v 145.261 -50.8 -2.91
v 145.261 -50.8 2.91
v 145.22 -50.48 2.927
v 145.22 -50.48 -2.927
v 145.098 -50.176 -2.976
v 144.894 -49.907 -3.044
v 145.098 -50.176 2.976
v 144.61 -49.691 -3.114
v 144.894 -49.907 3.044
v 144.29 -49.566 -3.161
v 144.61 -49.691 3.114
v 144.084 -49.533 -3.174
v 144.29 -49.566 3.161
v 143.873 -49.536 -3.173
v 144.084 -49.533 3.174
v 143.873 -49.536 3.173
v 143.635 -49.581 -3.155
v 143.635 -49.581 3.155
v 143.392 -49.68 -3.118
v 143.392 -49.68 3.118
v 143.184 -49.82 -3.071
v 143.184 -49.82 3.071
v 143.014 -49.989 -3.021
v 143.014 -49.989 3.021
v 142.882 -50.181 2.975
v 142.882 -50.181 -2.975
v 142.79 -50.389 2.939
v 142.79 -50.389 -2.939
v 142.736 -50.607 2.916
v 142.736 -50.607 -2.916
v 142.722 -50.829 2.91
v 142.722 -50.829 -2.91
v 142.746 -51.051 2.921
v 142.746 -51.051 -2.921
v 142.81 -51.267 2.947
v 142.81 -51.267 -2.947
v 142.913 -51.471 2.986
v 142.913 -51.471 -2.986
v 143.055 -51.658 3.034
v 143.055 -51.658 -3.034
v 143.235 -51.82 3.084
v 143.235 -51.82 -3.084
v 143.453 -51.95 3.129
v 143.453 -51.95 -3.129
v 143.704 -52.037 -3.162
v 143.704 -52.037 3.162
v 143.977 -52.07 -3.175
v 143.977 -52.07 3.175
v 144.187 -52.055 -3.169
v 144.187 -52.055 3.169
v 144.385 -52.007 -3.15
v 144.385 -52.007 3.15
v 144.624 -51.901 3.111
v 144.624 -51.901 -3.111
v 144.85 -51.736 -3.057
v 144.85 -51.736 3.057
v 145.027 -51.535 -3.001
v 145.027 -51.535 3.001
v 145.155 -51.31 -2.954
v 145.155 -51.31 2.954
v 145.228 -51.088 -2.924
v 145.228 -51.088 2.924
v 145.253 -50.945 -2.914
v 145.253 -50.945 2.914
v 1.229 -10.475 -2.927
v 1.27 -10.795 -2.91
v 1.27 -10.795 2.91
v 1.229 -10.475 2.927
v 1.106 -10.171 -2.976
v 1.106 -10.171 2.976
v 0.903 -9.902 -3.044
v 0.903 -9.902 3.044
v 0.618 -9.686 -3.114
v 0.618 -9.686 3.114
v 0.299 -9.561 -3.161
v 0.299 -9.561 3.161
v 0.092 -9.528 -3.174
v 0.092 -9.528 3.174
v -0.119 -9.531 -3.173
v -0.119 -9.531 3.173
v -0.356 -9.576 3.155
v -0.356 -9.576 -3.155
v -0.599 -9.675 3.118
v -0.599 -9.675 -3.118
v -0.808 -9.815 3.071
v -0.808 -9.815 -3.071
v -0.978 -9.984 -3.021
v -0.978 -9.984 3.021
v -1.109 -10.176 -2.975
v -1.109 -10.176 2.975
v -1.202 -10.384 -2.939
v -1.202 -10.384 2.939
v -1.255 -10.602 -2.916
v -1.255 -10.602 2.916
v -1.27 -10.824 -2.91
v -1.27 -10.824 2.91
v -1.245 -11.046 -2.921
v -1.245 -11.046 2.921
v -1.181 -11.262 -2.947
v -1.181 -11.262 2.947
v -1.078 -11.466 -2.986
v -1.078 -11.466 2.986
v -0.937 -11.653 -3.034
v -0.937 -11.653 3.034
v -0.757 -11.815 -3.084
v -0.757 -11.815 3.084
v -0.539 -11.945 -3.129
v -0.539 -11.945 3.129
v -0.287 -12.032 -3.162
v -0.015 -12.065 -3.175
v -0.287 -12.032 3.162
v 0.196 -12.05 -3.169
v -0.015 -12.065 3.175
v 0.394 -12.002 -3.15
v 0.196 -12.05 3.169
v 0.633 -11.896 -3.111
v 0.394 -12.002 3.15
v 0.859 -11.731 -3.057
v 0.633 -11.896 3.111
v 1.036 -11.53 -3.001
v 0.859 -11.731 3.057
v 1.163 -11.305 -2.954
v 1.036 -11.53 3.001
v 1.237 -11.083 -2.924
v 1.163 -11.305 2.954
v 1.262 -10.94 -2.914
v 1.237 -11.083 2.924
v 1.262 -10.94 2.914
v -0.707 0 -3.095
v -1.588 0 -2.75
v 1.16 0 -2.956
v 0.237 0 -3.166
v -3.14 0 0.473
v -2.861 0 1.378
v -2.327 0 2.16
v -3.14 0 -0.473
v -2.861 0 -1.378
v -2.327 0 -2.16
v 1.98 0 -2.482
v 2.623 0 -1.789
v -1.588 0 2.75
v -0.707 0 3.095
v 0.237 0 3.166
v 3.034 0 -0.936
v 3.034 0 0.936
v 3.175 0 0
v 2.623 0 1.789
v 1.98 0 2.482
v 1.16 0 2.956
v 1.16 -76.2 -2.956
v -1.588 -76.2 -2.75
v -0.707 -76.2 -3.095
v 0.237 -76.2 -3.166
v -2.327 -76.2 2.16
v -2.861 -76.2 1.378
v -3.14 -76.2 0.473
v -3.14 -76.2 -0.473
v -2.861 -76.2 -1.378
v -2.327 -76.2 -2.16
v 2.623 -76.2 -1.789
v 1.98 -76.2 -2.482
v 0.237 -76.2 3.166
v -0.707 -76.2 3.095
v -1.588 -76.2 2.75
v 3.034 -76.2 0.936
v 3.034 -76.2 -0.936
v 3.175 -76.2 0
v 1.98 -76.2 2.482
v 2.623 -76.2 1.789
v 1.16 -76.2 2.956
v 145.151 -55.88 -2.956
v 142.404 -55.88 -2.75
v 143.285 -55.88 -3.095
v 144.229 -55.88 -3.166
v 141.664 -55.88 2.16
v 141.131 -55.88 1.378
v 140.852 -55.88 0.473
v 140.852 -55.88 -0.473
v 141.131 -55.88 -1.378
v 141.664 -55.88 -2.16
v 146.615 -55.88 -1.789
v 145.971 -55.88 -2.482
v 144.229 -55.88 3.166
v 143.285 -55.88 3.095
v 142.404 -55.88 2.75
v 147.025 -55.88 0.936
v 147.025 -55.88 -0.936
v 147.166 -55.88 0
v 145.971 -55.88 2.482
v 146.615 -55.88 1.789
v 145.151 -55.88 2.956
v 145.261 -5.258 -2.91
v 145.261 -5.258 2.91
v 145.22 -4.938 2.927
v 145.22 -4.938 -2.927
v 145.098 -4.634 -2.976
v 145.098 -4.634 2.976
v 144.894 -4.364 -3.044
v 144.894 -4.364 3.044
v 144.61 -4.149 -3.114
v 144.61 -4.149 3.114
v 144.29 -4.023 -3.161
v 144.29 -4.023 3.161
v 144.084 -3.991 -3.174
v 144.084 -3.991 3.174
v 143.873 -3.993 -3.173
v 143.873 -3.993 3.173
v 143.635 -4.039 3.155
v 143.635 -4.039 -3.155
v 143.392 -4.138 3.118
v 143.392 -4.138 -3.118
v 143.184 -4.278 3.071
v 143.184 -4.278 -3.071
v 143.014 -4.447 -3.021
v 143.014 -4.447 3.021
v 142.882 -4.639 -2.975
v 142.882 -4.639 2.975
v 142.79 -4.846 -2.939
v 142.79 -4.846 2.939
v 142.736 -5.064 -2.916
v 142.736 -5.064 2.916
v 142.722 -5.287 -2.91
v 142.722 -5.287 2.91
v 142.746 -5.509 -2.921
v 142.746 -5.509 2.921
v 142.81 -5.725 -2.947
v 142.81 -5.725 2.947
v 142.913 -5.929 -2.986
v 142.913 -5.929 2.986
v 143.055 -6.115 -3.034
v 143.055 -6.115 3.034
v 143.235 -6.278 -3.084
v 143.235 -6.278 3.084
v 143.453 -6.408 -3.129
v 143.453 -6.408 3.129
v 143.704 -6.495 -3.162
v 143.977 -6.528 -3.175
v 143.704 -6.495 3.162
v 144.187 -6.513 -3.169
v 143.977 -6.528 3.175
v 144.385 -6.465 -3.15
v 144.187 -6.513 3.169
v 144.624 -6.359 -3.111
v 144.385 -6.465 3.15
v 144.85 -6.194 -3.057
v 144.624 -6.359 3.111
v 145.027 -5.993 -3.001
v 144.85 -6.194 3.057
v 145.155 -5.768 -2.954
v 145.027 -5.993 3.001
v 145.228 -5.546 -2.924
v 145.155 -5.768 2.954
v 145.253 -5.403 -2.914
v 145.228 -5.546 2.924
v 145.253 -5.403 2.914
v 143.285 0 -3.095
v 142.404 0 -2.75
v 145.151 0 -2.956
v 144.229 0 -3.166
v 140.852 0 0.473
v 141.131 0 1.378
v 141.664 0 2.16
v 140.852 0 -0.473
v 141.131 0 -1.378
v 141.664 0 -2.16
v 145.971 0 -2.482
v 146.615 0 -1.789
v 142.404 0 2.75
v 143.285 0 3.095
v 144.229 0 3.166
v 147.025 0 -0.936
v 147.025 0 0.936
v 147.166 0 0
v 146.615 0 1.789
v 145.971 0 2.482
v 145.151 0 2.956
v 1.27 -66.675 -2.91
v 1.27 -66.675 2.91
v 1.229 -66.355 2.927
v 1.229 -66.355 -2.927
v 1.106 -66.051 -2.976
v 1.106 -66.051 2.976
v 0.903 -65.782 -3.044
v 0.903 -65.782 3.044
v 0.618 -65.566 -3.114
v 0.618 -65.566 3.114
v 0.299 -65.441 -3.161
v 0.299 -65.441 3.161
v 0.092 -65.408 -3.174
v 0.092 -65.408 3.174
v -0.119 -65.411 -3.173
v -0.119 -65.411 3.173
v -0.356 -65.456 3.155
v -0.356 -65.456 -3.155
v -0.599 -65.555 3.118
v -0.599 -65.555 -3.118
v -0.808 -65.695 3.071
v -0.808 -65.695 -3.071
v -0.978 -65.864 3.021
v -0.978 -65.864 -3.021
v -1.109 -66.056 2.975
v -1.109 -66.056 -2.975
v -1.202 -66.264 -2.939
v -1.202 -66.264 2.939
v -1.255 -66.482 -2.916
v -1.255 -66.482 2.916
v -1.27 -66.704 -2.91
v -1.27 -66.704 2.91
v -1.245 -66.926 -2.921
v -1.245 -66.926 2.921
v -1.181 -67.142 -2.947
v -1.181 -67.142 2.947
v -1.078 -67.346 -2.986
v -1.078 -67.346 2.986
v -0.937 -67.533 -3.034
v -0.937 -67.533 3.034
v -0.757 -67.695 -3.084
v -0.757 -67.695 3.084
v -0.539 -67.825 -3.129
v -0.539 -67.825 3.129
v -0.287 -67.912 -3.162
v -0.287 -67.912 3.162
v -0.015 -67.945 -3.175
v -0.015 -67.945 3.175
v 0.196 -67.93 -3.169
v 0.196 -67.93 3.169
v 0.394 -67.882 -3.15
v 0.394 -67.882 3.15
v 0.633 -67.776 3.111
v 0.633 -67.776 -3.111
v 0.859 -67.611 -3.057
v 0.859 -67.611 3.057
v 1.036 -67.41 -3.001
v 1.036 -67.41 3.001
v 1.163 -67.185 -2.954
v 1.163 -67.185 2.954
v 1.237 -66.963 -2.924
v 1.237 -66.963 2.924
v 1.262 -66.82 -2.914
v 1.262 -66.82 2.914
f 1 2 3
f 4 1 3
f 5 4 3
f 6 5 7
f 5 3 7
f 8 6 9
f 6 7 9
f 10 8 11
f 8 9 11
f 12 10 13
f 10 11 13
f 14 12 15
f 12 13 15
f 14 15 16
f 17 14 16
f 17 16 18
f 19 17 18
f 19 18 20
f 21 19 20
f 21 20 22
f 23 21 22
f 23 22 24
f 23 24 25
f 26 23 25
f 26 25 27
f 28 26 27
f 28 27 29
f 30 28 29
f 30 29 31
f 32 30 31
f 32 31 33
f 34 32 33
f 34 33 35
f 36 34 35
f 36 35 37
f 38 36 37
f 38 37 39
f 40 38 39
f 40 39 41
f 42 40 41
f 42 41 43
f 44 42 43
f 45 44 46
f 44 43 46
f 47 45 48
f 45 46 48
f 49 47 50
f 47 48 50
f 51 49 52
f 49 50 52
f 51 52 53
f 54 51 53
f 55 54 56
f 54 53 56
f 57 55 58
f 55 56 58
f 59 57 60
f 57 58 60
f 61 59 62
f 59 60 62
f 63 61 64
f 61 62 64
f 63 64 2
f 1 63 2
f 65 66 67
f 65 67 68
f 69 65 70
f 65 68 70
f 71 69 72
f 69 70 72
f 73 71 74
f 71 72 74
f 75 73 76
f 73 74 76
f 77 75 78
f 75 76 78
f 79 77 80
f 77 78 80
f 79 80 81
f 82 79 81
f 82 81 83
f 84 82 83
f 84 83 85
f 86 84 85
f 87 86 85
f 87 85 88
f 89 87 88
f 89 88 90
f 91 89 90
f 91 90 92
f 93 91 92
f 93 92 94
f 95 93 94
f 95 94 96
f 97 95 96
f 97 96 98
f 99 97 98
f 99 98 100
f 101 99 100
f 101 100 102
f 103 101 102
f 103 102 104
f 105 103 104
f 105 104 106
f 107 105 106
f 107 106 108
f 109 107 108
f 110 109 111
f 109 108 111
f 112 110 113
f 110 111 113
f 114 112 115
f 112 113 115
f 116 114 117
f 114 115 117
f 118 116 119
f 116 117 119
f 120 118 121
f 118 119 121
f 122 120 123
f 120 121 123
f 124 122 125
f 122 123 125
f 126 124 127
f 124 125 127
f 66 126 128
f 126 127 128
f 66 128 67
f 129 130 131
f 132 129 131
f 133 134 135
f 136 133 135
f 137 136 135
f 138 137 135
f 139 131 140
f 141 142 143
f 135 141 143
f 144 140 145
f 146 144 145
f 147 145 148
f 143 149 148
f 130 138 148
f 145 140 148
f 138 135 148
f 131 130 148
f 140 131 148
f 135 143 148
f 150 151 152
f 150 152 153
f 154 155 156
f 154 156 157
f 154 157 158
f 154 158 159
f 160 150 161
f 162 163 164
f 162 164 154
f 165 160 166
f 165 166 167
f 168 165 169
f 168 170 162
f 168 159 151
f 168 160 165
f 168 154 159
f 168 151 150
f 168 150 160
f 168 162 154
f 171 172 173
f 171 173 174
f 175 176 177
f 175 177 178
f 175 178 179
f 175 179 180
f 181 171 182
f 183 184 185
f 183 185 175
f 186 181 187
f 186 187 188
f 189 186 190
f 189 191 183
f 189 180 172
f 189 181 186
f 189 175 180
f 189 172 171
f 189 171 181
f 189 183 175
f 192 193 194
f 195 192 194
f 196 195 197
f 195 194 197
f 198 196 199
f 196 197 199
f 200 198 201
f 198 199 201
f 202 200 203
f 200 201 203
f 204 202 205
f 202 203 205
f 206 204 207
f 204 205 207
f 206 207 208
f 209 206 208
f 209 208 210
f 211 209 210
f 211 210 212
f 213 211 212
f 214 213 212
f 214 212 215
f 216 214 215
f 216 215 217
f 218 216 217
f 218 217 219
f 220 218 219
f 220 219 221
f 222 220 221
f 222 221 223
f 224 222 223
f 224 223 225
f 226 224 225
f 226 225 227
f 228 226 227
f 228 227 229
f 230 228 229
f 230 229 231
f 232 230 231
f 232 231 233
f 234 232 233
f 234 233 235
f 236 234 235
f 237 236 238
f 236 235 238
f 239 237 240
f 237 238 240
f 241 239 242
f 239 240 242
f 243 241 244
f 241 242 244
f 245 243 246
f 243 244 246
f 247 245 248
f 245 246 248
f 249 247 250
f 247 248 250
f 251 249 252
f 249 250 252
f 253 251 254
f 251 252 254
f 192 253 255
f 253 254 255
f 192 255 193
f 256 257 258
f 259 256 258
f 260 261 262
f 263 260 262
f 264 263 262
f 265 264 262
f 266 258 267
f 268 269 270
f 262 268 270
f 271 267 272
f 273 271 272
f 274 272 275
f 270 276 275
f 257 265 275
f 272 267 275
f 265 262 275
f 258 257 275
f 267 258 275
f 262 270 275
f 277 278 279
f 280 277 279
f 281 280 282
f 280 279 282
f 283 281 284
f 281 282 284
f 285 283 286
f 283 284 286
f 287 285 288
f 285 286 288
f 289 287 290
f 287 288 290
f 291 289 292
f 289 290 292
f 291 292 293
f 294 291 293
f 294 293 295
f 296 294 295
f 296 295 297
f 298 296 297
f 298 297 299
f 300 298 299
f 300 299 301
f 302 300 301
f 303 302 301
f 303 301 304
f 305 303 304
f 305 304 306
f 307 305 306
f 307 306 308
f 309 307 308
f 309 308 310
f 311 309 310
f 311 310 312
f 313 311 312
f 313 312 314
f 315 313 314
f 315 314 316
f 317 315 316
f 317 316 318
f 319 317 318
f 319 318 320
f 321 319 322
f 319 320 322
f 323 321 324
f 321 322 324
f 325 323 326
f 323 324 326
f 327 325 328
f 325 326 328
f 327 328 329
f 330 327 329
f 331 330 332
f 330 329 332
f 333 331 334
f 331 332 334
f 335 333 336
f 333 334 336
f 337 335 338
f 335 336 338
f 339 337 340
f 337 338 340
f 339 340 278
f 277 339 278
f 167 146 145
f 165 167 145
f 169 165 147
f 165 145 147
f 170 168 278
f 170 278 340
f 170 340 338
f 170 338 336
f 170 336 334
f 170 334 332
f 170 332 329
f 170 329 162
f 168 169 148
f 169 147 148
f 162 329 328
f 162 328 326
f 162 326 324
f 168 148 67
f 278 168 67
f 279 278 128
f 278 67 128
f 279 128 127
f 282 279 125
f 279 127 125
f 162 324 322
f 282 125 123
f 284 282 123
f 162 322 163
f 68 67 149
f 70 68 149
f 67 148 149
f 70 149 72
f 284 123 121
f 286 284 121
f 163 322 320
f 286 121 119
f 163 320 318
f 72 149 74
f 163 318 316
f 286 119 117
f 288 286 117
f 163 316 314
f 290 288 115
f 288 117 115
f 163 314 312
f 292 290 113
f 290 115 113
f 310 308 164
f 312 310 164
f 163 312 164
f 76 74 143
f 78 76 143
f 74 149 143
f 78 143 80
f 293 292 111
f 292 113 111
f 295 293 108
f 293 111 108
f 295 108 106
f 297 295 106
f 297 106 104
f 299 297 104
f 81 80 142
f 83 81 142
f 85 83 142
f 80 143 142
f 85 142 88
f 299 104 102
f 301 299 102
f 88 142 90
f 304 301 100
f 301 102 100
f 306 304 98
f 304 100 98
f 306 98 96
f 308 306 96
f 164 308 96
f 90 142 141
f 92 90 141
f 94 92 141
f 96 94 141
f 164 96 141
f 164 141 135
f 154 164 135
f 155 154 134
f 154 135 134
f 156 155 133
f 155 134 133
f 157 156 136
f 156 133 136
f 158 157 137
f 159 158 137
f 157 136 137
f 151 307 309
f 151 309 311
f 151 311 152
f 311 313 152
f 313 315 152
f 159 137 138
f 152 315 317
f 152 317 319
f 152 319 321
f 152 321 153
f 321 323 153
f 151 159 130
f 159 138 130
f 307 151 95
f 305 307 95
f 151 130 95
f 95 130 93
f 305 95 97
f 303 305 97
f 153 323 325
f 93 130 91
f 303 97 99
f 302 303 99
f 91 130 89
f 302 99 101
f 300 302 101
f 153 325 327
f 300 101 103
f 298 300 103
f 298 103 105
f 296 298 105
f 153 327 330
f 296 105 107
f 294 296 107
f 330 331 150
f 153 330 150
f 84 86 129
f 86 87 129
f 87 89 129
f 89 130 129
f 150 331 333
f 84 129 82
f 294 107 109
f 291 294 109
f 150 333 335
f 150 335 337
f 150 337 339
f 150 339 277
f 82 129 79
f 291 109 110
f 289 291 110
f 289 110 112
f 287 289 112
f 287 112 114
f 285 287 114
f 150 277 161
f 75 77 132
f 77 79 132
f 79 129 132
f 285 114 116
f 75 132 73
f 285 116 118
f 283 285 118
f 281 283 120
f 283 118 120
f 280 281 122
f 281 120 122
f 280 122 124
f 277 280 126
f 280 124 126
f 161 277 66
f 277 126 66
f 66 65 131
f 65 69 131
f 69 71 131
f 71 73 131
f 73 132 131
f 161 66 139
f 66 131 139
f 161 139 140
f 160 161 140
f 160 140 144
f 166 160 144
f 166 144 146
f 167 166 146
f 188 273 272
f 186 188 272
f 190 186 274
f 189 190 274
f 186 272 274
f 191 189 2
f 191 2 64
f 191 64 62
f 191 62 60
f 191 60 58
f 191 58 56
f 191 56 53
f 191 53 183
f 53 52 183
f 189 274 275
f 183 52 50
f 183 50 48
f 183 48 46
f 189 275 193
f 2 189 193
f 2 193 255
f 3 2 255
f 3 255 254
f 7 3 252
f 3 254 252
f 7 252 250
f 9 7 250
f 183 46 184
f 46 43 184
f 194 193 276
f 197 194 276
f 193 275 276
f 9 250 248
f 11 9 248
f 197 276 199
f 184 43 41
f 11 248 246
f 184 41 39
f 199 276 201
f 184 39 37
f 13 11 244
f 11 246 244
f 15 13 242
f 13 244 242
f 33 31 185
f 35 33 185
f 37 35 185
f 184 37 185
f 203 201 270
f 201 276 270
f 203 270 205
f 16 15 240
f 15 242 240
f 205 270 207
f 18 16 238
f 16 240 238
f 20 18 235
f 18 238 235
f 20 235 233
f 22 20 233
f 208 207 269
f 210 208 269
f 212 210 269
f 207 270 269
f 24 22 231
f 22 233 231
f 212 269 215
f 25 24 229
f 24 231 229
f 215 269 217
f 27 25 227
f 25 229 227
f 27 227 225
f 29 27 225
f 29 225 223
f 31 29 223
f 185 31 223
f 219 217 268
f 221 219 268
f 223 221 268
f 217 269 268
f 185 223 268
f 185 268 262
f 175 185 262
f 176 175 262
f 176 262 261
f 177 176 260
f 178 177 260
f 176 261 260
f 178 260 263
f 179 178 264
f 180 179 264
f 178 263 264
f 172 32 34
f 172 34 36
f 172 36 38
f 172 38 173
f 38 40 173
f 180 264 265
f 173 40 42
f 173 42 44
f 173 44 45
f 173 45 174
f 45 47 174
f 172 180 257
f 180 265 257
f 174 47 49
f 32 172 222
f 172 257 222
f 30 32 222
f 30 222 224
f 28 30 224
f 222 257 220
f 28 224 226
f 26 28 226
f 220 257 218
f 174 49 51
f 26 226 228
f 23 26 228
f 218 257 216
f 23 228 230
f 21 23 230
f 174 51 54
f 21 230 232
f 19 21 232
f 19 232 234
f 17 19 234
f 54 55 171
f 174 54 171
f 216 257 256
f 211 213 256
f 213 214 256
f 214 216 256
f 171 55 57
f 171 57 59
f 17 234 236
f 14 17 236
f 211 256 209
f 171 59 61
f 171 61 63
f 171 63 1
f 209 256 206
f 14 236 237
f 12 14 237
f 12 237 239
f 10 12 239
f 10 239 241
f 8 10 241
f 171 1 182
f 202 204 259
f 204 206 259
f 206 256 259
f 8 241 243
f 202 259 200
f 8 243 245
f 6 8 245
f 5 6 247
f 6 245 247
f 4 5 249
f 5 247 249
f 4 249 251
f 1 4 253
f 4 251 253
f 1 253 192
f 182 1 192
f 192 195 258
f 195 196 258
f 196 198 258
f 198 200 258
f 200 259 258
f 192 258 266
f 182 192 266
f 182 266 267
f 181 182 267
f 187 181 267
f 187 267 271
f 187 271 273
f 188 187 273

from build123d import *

# Parameters (mm, degrees)
F0_R     = 3.175
F1_DEPTH = 76.2
F2_DEPTH = 55.88
F4_R     = 1.27
F5_DEPTH = 25.4


with BuildPart() as f1:
    # F0 (on Front) → F1 (new body)
    with BuildSketch(Plane.XZ):
        Circle(F0_R)
    extrude(amount=F1_DEPTH)


with BuildPart() as f2:
    # F0 (on Front) → F2 (new body)
    with BuildSketch(Plane.XZ):
        with Locations((143.99133, 0)):
            Circle(F0_R)
    extrude(amount=F2_DEPTH)


with BuildPart() as f5_tool:
    # F4 (on offset) → F5 (new body)
    with BuildSketch(Plane.XY.offset(3.81)):
        with Locations((0, -66.675)):
            Circle(F4_R)
        with Locations((0, -10.795)):
            Circle(F4_R)
        with Locations((143.99133, -50.8)):
            Circle(F4_R)
        with Locations((143.99133, -5.2578)):
            Circle(F4_R)
    extrude(amount=-F5_DEPTH)


with BuildPart() as f1_1:
    add(f1.part)

    # F5: cut by f5_tool
    add(f5_tool.part, mode=Mode.SUBTRACT)


with BuildPart() as f2_1:
    add(f2.part)

    # F5: cut by f5_tool
    add(f5_tool.part, mode=Mode.SUBTRACT)


solid = Compound([f1_1.part, f2_1.part])
